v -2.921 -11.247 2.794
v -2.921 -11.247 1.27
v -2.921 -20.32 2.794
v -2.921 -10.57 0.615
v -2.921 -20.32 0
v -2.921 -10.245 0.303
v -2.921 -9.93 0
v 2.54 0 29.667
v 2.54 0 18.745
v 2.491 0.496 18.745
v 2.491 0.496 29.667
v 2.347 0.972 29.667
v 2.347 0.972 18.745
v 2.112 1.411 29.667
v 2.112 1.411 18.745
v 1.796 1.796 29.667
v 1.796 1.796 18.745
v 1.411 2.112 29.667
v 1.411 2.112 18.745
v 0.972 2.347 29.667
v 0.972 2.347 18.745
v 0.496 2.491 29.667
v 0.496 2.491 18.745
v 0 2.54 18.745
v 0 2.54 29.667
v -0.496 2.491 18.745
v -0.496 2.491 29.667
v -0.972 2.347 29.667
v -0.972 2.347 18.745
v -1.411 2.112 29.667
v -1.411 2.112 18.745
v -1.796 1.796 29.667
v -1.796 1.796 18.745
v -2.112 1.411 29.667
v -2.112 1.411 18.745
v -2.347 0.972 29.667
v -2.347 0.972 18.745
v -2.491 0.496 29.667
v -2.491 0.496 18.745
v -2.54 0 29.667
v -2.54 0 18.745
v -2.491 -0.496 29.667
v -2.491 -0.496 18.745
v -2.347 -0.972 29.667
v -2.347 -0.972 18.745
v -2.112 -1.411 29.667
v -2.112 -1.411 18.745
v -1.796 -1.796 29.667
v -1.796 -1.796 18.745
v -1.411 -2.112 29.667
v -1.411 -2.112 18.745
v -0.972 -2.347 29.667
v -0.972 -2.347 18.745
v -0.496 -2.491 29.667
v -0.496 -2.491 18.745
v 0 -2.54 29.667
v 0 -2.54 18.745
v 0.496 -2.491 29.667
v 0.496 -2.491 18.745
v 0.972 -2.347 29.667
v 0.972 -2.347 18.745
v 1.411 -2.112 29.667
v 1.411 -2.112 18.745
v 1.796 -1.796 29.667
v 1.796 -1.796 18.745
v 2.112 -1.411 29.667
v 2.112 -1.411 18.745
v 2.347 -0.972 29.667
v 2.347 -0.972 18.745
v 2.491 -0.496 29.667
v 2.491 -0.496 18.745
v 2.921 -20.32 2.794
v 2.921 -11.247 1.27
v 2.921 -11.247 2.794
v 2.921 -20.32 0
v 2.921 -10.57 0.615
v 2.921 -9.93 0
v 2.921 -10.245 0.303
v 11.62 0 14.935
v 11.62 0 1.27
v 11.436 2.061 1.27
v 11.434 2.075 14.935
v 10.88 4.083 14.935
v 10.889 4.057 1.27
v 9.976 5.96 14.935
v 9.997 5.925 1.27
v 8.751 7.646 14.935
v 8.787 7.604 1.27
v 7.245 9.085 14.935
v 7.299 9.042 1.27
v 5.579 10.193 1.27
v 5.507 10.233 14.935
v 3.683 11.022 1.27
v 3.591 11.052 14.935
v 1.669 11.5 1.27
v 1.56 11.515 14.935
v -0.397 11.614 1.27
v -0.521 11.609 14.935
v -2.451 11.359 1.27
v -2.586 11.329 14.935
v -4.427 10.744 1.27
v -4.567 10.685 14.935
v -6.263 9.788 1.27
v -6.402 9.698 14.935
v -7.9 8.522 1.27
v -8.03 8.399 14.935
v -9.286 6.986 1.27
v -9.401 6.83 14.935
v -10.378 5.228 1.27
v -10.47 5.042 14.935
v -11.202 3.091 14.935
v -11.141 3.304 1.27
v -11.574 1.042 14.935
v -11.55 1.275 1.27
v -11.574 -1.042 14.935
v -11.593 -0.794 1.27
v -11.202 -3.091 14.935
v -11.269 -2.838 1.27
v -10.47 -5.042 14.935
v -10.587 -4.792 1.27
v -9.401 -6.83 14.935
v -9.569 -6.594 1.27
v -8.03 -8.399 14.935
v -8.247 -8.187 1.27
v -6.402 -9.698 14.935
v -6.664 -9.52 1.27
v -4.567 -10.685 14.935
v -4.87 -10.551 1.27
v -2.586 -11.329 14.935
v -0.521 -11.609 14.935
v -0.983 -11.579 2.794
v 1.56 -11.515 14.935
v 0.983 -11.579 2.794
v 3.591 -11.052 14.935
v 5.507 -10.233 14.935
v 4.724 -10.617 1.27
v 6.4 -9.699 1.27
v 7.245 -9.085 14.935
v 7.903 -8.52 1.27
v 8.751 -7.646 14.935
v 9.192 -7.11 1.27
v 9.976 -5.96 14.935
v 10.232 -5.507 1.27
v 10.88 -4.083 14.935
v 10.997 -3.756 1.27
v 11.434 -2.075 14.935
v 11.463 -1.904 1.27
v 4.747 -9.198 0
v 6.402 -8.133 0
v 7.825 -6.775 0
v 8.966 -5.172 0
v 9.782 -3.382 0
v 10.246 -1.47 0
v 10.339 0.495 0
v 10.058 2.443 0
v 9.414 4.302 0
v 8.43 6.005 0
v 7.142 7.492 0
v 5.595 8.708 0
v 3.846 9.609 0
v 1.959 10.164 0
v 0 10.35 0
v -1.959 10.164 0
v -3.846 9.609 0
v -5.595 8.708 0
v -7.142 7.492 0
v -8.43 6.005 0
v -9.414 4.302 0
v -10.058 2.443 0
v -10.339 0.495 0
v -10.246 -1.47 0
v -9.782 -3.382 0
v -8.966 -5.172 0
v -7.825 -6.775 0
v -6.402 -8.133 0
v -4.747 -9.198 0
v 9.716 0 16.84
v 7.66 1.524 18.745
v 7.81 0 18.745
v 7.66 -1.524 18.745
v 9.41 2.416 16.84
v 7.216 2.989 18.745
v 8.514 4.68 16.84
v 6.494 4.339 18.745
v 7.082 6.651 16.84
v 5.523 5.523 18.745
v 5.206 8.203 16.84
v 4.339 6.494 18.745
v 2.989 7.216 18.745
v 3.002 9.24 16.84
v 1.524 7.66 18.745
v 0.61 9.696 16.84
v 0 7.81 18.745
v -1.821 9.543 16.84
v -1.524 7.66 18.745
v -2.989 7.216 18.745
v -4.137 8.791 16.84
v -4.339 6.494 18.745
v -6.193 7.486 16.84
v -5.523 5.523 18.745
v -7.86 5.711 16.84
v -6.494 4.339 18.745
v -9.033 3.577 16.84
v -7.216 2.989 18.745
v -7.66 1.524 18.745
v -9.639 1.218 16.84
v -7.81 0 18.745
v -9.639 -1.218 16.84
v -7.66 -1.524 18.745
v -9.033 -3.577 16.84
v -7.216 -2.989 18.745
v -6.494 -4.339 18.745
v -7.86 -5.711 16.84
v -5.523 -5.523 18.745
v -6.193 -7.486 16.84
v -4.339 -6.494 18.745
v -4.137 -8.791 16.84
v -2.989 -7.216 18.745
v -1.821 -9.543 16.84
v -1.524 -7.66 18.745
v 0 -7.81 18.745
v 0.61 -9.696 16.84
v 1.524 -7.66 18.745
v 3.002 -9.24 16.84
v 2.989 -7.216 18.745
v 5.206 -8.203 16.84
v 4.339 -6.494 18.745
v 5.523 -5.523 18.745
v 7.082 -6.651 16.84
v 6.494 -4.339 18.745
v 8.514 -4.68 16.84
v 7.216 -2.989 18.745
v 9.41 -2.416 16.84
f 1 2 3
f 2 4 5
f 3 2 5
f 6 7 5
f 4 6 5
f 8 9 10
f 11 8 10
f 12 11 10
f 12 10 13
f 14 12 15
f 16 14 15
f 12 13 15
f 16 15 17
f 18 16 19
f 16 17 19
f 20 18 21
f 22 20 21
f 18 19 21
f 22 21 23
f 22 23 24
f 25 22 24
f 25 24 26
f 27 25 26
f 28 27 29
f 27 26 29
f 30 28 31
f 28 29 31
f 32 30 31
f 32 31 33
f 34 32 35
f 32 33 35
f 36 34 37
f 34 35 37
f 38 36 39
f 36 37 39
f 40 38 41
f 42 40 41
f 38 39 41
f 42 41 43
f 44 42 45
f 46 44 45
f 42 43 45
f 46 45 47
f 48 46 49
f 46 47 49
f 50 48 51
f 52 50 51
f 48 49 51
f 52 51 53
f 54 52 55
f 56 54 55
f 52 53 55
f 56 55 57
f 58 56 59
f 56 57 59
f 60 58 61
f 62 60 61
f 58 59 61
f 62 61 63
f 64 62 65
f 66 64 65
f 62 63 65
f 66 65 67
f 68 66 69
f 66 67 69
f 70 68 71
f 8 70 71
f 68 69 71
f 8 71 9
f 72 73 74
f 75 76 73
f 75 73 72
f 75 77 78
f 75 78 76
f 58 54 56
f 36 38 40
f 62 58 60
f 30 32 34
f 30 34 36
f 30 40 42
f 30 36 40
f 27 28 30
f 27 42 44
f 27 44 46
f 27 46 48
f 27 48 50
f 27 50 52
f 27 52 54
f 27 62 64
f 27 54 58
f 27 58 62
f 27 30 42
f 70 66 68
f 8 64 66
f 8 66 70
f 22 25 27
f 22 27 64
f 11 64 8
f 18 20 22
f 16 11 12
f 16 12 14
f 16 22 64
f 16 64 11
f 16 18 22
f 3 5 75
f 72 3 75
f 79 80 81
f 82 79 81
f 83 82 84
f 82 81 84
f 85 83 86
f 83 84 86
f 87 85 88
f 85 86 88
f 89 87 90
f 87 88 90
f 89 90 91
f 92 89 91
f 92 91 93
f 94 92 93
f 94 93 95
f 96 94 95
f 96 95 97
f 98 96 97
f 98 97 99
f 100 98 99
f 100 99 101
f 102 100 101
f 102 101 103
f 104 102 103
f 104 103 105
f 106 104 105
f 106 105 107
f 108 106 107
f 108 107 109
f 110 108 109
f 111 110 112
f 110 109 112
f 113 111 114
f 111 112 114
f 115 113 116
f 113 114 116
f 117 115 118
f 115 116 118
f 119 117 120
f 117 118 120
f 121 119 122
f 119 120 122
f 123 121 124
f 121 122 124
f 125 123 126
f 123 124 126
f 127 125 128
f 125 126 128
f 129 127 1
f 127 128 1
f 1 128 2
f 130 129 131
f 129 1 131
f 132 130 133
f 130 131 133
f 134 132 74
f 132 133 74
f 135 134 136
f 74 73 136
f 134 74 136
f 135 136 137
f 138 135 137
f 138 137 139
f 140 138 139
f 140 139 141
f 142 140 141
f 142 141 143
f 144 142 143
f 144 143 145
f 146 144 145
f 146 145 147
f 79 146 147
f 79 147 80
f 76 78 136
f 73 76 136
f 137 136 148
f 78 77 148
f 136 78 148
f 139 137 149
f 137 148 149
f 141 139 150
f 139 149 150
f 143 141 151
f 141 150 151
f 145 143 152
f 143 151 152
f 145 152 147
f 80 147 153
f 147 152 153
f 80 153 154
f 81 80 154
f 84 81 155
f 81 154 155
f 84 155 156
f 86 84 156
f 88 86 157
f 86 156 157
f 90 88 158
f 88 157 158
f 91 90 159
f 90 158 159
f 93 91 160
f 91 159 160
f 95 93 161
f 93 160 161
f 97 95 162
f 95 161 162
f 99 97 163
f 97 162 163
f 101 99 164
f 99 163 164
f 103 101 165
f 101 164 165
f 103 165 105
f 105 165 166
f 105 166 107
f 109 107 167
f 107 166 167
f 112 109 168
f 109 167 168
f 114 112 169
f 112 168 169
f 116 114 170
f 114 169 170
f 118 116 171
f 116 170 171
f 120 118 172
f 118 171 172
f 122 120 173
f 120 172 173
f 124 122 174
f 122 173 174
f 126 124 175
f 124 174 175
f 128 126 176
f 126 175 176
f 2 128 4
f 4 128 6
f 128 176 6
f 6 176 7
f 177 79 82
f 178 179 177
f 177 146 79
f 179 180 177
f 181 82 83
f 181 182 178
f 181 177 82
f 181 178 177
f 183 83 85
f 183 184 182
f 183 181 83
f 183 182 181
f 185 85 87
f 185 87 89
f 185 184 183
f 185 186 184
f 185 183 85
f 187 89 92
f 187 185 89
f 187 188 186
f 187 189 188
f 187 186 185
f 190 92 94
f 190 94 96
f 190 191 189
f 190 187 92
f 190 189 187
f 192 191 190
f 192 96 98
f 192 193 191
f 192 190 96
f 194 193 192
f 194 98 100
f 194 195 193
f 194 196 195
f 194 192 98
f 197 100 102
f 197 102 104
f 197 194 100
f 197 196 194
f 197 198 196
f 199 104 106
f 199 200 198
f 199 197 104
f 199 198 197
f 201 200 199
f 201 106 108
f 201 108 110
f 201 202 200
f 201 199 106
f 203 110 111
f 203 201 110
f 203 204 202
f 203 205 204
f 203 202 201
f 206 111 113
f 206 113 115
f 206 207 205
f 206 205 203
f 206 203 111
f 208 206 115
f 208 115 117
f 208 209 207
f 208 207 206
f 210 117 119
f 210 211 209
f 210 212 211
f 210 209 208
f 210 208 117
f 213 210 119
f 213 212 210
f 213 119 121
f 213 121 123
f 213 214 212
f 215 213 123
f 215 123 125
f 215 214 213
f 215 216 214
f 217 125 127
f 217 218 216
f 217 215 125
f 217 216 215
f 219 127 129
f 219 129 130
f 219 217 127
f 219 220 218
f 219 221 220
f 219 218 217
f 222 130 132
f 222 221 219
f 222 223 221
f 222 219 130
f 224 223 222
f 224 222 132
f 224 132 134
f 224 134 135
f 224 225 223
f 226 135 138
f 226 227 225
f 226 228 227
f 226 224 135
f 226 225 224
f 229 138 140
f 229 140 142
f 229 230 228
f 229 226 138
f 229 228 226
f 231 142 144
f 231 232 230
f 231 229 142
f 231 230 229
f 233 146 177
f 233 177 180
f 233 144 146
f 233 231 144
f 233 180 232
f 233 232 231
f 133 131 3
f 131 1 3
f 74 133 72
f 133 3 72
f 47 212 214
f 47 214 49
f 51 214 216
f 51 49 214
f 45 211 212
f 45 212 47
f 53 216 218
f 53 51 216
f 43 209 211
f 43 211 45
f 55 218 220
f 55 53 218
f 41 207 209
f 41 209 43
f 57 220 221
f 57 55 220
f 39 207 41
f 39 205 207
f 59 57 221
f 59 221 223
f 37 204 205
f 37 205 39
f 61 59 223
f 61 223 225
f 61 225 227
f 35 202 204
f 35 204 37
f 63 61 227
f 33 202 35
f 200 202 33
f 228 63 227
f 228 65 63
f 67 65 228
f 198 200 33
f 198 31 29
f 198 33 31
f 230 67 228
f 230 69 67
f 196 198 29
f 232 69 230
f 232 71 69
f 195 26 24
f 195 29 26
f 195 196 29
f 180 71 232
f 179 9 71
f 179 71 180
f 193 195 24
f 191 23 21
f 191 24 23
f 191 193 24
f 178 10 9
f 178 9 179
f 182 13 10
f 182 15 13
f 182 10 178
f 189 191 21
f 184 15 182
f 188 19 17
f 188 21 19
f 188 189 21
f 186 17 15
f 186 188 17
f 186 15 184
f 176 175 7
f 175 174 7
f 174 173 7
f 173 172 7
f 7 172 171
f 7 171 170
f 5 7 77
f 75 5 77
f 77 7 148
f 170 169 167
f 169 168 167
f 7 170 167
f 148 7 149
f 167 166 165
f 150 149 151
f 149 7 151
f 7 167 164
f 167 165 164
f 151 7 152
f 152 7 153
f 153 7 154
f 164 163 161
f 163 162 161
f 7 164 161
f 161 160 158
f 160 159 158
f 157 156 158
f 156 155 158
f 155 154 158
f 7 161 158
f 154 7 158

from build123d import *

# Parameters (mm, degrees)
F0_R     = 11.6205
F1_DEPTH = 18.7452
F2_R     = 2.54
F3_DEPTH = 10.922
F4_SIZE  = 3.81
F5_SIZE  = 1.27
F6_W     = 5.842
F6_H     = 20.32
F7_DEPTH = 2.794


with BuildPart() as f1:
    # F0 (on Top) → F1 (new body)
    with BuildSketch(Plane.XY):
        Circle(F0_R)
    extrude(amount=F1_DEPTH)

    # F2 (on face) → F3 (join)
    with BuildSketch(Plane.XY.offset(18.7452)):
        Circle(F2_R)
    extrude(amount=F3_DEPTH)

    # F4
    f4_edges = [f1.edges().sort_by_distance(p)[0] for p in [
        (-11.6205, 0, 18.7452),
    ]]
    chamfer(f4_edges, length=F4_SIZE)

    # F5
    f5_edges = [f1.edges().sort_by_distance(p)[0] for p in [
        (-11.6205, 0, 0),
    ]]
    chamfer(f5_edges, length=F5_SIZE)

    # F6 (on face) → F7 (join)
    with BuildSketch(Plane(origin=(0, 0, 0), x_dir=(1, 0, 0), z_dir=(0, 0, -1))):
        with Locations((0, 10.16)):
            Rectangle(F6_W, F6_H)
    extrude(amount=-F7_DEPTH)


solid = f1.part
